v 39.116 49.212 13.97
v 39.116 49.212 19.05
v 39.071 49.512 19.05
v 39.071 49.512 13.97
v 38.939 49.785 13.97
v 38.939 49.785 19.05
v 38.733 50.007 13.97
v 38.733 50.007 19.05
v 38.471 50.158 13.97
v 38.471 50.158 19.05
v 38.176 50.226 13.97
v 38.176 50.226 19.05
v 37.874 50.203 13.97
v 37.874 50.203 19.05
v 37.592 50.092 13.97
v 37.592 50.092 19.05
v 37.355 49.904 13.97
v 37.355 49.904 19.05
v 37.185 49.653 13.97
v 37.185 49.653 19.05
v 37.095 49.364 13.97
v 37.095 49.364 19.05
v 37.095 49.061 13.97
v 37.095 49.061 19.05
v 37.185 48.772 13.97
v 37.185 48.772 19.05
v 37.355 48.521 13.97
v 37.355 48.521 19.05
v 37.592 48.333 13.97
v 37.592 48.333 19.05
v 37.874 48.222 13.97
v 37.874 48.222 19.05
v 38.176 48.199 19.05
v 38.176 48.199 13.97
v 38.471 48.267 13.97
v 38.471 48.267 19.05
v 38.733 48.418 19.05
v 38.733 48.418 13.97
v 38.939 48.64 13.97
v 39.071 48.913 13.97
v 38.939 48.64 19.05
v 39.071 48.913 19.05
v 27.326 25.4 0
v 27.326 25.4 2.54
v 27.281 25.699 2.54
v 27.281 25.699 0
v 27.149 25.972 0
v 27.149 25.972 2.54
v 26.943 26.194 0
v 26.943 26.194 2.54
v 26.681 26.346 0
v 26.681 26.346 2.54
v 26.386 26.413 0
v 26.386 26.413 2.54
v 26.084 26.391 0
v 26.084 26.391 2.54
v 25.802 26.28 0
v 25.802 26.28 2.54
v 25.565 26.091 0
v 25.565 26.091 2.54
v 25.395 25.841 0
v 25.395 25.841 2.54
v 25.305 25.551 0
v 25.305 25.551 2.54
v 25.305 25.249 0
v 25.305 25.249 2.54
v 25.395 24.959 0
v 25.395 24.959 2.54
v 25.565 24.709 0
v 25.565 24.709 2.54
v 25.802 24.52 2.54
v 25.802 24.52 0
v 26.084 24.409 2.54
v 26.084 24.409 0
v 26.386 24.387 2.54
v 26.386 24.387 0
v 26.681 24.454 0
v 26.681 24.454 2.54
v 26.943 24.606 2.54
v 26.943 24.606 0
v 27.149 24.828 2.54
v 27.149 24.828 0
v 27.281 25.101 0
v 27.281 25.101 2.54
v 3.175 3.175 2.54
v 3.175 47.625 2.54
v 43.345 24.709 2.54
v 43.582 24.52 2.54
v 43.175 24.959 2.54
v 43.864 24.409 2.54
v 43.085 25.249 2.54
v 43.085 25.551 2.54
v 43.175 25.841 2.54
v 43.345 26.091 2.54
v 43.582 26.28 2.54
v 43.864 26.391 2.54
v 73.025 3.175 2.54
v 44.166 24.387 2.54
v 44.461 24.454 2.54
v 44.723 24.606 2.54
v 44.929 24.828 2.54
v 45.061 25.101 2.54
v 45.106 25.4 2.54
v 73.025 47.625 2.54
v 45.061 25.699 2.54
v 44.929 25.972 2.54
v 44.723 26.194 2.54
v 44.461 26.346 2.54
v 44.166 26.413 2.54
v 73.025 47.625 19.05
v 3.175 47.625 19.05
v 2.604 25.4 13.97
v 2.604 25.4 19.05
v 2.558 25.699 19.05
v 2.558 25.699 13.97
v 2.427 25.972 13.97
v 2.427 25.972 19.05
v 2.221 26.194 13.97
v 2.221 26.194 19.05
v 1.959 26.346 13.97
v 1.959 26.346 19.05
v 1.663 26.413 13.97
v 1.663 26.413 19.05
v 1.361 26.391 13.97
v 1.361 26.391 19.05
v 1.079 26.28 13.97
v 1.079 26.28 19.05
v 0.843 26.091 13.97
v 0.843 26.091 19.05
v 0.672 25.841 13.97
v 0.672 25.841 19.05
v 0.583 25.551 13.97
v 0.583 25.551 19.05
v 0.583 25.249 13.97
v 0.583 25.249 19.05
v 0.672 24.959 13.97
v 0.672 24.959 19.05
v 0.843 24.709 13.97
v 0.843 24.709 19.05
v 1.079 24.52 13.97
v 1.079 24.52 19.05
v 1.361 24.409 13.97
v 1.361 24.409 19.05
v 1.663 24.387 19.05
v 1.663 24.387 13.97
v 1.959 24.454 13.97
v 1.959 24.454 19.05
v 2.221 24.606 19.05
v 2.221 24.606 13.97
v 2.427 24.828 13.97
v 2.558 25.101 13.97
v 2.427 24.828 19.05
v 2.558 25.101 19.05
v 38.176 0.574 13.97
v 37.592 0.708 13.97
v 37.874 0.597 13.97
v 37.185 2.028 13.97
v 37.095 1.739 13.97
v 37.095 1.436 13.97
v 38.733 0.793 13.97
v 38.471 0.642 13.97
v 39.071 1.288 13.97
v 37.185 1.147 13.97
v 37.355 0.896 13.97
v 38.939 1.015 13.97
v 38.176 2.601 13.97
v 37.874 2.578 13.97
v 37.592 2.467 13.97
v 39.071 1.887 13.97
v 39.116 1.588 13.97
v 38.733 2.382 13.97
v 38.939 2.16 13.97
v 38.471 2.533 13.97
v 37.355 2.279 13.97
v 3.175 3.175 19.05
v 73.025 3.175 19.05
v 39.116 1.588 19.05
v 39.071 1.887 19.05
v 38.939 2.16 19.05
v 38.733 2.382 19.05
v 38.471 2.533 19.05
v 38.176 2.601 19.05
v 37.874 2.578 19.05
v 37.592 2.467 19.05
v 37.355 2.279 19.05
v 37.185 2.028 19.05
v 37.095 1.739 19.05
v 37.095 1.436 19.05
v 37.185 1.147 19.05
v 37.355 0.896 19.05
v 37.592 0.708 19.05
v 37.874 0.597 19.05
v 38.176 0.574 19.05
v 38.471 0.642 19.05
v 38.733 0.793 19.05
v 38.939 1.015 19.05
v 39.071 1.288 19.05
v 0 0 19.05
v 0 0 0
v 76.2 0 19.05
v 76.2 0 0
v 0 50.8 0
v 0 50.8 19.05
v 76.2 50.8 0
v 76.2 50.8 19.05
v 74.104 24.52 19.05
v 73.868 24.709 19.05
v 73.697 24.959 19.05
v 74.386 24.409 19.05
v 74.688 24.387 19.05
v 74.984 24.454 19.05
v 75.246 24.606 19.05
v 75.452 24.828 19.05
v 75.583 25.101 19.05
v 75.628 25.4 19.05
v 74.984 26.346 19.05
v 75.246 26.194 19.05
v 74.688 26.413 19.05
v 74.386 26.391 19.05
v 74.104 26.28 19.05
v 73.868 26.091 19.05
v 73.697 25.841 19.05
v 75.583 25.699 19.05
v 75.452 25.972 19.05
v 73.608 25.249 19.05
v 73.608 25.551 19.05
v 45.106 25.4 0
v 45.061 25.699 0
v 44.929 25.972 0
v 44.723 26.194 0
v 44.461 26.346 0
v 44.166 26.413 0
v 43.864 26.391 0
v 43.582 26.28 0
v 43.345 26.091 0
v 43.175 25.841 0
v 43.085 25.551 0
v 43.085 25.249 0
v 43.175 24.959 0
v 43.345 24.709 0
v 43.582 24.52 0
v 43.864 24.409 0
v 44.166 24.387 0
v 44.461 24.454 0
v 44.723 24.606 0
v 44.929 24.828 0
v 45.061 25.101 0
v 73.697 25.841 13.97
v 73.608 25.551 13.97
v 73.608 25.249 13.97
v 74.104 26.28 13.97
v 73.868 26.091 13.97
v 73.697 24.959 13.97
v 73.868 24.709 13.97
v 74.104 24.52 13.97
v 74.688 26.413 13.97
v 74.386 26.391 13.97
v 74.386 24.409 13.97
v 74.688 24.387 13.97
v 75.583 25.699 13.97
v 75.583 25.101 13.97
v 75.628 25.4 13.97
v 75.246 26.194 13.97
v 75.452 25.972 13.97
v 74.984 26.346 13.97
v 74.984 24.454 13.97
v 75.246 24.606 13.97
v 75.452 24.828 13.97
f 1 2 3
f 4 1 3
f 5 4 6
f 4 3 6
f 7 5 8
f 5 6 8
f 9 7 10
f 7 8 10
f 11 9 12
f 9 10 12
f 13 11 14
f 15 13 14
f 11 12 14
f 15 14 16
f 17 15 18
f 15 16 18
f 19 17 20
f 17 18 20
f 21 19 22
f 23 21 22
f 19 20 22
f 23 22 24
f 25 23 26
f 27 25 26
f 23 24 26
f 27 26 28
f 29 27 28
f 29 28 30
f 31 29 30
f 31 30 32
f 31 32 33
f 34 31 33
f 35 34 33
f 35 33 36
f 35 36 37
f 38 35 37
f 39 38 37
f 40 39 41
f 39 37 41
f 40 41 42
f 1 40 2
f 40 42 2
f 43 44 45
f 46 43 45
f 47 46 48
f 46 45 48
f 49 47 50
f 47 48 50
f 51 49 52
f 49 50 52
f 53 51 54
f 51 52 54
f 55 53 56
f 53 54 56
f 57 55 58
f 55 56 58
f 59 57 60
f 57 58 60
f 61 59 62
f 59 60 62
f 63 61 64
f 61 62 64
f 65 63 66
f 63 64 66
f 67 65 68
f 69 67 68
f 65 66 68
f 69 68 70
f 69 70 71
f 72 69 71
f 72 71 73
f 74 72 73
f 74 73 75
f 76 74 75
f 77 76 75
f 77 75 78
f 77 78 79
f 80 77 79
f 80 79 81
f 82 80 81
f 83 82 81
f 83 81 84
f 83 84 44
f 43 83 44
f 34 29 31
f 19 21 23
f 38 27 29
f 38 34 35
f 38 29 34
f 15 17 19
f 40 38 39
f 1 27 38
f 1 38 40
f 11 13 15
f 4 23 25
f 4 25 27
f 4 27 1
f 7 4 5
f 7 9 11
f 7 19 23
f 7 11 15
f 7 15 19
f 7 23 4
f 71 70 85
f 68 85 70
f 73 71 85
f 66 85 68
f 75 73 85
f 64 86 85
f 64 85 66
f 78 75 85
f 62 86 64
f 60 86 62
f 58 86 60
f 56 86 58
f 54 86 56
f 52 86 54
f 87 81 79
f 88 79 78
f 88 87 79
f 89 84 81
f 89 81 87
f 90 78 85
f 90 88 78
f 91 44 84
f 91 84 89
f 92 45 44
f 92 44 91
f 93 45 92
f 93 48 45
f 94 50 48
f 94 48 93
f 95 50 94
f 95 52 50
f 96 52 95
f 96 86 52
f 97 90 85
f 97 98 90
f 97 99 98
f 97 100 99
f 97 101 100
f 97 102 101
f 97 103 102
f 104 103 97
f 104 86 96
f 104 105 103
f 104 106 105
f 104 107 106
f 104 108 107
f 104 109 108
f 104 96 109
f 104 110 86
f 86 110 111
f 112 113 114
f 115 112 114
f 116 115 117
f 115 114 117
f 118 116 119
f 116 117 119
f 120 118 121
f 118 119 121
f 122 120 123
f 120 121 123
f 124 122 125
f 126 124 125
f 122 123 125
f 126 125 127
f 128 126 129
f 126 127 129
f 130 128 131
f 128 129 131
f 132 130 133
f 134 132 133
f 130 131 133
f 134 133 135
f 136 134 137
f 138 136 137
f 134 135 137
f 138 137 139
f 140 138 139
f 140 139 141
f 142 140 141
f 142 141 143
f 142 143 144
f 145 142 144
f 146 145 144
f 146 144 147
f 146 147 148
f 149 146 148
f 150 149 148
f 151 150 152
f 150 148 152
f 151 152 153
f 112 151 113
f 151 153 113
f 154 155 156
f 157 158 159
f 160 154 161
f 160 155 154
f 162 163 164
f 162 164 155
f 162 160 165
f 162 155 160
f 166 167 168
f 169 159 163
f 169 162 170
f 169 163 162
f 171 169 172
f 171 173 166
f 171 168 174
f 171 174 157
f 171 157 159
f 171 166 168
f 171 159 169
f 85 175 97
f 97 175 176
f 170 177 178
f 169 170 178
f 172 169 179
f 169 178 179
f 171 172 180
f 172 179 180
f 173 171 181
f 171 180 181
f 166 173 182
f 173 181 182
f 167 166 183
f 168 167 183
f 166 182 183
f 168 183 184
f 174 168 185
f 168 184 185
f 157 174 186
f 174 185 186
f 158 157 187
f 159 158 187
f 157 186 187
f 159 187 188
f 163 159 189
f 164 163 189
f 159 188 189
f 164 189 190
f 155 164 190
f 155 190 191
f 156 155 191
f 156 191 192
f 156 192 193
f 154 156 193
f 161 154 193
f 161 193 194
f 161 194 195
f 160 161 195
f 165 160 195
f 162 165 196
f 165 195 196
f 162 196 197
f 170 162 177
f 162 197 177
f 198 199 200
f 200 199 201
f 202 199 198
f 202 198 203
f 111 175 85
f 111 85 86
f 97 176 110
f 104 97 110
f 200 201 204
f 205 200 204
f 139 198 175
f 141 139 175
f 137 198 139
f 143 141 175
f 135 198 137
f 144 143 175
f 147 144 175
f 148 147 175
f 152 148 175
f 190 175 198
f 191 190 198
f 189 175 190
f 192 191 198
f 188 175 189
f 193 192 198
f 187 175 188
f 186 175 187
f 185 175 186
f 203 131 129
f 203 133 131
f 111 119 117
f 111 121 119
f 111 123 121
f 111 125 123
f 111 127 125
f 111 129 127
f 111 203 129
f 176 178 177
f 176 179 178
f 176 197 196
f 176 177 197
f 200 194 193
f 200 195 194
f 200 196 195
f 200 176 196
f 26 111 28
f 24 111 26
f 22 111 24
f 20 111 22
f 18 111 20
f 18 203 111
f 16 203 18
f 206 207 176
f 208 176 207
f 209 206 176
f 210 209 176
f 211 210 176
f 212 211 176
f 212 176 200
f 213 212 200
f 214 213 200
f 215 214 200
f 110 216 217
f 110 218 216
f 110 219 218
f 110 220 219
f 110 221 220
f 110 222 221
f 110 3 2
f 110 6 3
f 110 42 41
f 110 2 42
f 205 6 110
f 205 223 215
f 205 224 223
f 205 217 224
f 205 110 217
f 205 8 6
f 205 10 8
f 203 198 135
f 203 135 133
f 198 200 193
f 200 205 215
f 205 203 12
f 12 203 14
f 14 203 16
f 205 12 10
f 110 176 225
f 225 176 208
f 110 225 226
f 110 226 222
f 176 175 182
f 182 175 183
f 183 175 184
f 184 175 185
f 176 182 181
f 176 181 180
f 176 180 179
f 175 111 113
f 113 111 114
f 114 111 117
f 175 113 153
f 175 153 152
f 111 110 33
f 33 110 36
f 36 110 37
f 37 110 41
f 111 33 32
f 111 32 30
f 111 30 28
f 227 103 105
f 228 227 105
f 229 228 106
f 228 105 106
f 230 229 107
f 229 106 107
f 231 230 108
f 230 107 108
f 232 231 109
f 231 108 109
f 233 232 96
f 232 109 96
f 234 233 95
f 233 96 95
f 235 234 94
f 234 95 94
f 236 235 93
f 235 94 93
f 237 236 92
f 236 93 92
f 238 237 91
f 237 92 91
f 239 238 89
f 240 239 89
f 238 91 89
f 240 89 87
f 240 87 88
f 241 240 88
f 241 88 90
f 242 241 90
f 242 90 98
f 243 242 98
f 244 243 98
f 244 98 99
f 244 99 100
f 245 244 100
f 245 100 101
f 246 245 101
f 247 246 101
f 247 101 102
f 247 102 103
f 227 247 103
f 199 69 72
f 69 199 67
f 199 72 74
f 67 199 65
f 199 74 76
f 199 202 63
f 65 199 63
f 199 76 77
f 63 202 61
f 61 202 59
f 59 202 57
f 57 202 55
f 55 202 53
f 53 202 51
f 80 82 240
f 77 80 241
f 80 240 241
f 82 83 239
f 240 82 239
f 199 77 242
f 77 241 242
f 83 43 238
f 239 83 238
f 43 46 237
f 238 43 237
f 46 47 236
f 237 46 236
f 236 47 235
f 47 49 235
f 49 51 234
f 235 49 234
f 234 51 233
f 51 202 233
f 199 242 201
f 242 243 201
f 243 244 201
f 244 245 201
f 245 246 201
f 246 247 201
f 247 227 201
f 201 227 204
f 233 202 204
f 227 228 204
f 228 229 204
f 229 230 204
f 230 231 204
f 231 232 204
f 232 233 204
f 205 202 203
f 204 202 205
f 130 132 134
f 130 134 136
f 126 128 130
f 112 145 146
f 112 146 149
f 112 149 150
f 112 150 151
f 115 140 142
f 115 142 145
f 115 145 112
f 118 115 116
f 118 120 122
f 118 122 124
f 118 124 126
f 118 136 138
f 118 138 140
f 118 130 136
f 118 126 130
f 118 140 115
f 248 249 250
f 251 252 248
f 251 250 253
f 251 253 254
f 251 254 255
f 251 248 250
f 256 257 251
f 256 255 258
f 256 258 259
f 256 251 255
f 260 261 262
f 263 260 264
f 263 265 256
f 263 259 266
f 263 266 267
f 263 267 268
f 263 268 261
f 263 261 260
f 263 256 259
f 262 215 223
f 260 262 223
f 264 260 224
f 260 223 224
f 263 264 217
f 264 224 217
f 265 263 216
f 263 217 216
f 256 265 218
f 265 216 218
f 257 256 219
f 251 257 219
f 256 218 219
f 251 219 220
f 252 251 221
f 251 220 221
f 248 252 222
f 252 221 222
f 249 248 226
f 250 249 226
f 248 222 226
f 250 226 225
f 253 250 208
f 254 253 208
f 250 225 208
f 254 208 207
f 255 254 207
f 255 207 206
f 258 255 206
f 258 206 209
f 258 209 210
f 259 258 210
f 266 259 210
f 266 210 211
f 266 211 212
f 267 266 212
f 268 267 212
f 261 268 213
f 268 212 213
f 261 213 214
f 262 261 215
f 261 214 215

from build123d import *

# Parameters (mm, degrees)
SKETCH1_W           = 76.2
SKETCH1_H           = 50.8
BOSS_EXTRUDE1_DEPTH = 19.05
SKETCH2_W           = 34.925
SKETCH2_H           = 44.45
CUT_EXTRUDE1_DEPTH  = 16.51
SKETCH4_R           = 1.016
CUT_EXTRUDE4_DEPTH  = 5.08
SKETCH6_R           = 1.016
CUT_EXTRUDE6_DEPTH  = 94.057294717


with BuildPart() as part:
    # Sketch1 → Boss-Extrude1 (new body)
    with BuildSketch(Plane.XY):
        with Locations((38.1, 25.4)):
            Rectangle(SKETCH1_W, SKETCH1_H)
    extrude(amount=BOSS_EXTRUDE1_DEPTH)

    # Sketch2 → Cut-Extrude1 (cut)
    with BuildSketch(Plane.XY.offset(19.05)):
        with Locations((55.5625, 25.4)):
            Rectangle(SKETCH2_W, SKETCH2_H)
        with Locations((20.6375, 25.4)):
            Rectangle(SKETCH2_W, SKETCH2_H)
    extrude(amount=-CUT_EXTRUDE1_DEPTH, mode=Mode.SUBTRACT)

    # Sketch4 → Cut-Extrude4 (cut)
    with BuildSketch(Plane.XY.offset(19.05)):
        with Locations((1.5875, 25.4)):
            Circle(SKETCH4_R)
        with Locations((38.1, 49.2125)):
            Circle(SKETCH4_R)
        with Locations((74.6125, 25.4)):
            Circle(SKETCH4_R)
        with Locations((38.1, 1.5875)):
            Circle(SKETCH4_R)
    extrude(amount=-CUT_EXTRUDE4_DEPTH, mode=Mode.SUBTRACT)

    # Sketch6 → Cut-Extrude6 (cut, through all)
    with BuildSketch(Plane.XY.offset(2.54)):
        with Locations((26.310023895, 25.4)):
            Circle(SKETCH6_R)
        with Locations((44.090023895, 25.4)):
            Circle(SKETCH6_R)
    extrude(amount=-CUT_EXTRUDE6_DEPTH, mode=Mode.SUBTRACT)


solid = part.part
